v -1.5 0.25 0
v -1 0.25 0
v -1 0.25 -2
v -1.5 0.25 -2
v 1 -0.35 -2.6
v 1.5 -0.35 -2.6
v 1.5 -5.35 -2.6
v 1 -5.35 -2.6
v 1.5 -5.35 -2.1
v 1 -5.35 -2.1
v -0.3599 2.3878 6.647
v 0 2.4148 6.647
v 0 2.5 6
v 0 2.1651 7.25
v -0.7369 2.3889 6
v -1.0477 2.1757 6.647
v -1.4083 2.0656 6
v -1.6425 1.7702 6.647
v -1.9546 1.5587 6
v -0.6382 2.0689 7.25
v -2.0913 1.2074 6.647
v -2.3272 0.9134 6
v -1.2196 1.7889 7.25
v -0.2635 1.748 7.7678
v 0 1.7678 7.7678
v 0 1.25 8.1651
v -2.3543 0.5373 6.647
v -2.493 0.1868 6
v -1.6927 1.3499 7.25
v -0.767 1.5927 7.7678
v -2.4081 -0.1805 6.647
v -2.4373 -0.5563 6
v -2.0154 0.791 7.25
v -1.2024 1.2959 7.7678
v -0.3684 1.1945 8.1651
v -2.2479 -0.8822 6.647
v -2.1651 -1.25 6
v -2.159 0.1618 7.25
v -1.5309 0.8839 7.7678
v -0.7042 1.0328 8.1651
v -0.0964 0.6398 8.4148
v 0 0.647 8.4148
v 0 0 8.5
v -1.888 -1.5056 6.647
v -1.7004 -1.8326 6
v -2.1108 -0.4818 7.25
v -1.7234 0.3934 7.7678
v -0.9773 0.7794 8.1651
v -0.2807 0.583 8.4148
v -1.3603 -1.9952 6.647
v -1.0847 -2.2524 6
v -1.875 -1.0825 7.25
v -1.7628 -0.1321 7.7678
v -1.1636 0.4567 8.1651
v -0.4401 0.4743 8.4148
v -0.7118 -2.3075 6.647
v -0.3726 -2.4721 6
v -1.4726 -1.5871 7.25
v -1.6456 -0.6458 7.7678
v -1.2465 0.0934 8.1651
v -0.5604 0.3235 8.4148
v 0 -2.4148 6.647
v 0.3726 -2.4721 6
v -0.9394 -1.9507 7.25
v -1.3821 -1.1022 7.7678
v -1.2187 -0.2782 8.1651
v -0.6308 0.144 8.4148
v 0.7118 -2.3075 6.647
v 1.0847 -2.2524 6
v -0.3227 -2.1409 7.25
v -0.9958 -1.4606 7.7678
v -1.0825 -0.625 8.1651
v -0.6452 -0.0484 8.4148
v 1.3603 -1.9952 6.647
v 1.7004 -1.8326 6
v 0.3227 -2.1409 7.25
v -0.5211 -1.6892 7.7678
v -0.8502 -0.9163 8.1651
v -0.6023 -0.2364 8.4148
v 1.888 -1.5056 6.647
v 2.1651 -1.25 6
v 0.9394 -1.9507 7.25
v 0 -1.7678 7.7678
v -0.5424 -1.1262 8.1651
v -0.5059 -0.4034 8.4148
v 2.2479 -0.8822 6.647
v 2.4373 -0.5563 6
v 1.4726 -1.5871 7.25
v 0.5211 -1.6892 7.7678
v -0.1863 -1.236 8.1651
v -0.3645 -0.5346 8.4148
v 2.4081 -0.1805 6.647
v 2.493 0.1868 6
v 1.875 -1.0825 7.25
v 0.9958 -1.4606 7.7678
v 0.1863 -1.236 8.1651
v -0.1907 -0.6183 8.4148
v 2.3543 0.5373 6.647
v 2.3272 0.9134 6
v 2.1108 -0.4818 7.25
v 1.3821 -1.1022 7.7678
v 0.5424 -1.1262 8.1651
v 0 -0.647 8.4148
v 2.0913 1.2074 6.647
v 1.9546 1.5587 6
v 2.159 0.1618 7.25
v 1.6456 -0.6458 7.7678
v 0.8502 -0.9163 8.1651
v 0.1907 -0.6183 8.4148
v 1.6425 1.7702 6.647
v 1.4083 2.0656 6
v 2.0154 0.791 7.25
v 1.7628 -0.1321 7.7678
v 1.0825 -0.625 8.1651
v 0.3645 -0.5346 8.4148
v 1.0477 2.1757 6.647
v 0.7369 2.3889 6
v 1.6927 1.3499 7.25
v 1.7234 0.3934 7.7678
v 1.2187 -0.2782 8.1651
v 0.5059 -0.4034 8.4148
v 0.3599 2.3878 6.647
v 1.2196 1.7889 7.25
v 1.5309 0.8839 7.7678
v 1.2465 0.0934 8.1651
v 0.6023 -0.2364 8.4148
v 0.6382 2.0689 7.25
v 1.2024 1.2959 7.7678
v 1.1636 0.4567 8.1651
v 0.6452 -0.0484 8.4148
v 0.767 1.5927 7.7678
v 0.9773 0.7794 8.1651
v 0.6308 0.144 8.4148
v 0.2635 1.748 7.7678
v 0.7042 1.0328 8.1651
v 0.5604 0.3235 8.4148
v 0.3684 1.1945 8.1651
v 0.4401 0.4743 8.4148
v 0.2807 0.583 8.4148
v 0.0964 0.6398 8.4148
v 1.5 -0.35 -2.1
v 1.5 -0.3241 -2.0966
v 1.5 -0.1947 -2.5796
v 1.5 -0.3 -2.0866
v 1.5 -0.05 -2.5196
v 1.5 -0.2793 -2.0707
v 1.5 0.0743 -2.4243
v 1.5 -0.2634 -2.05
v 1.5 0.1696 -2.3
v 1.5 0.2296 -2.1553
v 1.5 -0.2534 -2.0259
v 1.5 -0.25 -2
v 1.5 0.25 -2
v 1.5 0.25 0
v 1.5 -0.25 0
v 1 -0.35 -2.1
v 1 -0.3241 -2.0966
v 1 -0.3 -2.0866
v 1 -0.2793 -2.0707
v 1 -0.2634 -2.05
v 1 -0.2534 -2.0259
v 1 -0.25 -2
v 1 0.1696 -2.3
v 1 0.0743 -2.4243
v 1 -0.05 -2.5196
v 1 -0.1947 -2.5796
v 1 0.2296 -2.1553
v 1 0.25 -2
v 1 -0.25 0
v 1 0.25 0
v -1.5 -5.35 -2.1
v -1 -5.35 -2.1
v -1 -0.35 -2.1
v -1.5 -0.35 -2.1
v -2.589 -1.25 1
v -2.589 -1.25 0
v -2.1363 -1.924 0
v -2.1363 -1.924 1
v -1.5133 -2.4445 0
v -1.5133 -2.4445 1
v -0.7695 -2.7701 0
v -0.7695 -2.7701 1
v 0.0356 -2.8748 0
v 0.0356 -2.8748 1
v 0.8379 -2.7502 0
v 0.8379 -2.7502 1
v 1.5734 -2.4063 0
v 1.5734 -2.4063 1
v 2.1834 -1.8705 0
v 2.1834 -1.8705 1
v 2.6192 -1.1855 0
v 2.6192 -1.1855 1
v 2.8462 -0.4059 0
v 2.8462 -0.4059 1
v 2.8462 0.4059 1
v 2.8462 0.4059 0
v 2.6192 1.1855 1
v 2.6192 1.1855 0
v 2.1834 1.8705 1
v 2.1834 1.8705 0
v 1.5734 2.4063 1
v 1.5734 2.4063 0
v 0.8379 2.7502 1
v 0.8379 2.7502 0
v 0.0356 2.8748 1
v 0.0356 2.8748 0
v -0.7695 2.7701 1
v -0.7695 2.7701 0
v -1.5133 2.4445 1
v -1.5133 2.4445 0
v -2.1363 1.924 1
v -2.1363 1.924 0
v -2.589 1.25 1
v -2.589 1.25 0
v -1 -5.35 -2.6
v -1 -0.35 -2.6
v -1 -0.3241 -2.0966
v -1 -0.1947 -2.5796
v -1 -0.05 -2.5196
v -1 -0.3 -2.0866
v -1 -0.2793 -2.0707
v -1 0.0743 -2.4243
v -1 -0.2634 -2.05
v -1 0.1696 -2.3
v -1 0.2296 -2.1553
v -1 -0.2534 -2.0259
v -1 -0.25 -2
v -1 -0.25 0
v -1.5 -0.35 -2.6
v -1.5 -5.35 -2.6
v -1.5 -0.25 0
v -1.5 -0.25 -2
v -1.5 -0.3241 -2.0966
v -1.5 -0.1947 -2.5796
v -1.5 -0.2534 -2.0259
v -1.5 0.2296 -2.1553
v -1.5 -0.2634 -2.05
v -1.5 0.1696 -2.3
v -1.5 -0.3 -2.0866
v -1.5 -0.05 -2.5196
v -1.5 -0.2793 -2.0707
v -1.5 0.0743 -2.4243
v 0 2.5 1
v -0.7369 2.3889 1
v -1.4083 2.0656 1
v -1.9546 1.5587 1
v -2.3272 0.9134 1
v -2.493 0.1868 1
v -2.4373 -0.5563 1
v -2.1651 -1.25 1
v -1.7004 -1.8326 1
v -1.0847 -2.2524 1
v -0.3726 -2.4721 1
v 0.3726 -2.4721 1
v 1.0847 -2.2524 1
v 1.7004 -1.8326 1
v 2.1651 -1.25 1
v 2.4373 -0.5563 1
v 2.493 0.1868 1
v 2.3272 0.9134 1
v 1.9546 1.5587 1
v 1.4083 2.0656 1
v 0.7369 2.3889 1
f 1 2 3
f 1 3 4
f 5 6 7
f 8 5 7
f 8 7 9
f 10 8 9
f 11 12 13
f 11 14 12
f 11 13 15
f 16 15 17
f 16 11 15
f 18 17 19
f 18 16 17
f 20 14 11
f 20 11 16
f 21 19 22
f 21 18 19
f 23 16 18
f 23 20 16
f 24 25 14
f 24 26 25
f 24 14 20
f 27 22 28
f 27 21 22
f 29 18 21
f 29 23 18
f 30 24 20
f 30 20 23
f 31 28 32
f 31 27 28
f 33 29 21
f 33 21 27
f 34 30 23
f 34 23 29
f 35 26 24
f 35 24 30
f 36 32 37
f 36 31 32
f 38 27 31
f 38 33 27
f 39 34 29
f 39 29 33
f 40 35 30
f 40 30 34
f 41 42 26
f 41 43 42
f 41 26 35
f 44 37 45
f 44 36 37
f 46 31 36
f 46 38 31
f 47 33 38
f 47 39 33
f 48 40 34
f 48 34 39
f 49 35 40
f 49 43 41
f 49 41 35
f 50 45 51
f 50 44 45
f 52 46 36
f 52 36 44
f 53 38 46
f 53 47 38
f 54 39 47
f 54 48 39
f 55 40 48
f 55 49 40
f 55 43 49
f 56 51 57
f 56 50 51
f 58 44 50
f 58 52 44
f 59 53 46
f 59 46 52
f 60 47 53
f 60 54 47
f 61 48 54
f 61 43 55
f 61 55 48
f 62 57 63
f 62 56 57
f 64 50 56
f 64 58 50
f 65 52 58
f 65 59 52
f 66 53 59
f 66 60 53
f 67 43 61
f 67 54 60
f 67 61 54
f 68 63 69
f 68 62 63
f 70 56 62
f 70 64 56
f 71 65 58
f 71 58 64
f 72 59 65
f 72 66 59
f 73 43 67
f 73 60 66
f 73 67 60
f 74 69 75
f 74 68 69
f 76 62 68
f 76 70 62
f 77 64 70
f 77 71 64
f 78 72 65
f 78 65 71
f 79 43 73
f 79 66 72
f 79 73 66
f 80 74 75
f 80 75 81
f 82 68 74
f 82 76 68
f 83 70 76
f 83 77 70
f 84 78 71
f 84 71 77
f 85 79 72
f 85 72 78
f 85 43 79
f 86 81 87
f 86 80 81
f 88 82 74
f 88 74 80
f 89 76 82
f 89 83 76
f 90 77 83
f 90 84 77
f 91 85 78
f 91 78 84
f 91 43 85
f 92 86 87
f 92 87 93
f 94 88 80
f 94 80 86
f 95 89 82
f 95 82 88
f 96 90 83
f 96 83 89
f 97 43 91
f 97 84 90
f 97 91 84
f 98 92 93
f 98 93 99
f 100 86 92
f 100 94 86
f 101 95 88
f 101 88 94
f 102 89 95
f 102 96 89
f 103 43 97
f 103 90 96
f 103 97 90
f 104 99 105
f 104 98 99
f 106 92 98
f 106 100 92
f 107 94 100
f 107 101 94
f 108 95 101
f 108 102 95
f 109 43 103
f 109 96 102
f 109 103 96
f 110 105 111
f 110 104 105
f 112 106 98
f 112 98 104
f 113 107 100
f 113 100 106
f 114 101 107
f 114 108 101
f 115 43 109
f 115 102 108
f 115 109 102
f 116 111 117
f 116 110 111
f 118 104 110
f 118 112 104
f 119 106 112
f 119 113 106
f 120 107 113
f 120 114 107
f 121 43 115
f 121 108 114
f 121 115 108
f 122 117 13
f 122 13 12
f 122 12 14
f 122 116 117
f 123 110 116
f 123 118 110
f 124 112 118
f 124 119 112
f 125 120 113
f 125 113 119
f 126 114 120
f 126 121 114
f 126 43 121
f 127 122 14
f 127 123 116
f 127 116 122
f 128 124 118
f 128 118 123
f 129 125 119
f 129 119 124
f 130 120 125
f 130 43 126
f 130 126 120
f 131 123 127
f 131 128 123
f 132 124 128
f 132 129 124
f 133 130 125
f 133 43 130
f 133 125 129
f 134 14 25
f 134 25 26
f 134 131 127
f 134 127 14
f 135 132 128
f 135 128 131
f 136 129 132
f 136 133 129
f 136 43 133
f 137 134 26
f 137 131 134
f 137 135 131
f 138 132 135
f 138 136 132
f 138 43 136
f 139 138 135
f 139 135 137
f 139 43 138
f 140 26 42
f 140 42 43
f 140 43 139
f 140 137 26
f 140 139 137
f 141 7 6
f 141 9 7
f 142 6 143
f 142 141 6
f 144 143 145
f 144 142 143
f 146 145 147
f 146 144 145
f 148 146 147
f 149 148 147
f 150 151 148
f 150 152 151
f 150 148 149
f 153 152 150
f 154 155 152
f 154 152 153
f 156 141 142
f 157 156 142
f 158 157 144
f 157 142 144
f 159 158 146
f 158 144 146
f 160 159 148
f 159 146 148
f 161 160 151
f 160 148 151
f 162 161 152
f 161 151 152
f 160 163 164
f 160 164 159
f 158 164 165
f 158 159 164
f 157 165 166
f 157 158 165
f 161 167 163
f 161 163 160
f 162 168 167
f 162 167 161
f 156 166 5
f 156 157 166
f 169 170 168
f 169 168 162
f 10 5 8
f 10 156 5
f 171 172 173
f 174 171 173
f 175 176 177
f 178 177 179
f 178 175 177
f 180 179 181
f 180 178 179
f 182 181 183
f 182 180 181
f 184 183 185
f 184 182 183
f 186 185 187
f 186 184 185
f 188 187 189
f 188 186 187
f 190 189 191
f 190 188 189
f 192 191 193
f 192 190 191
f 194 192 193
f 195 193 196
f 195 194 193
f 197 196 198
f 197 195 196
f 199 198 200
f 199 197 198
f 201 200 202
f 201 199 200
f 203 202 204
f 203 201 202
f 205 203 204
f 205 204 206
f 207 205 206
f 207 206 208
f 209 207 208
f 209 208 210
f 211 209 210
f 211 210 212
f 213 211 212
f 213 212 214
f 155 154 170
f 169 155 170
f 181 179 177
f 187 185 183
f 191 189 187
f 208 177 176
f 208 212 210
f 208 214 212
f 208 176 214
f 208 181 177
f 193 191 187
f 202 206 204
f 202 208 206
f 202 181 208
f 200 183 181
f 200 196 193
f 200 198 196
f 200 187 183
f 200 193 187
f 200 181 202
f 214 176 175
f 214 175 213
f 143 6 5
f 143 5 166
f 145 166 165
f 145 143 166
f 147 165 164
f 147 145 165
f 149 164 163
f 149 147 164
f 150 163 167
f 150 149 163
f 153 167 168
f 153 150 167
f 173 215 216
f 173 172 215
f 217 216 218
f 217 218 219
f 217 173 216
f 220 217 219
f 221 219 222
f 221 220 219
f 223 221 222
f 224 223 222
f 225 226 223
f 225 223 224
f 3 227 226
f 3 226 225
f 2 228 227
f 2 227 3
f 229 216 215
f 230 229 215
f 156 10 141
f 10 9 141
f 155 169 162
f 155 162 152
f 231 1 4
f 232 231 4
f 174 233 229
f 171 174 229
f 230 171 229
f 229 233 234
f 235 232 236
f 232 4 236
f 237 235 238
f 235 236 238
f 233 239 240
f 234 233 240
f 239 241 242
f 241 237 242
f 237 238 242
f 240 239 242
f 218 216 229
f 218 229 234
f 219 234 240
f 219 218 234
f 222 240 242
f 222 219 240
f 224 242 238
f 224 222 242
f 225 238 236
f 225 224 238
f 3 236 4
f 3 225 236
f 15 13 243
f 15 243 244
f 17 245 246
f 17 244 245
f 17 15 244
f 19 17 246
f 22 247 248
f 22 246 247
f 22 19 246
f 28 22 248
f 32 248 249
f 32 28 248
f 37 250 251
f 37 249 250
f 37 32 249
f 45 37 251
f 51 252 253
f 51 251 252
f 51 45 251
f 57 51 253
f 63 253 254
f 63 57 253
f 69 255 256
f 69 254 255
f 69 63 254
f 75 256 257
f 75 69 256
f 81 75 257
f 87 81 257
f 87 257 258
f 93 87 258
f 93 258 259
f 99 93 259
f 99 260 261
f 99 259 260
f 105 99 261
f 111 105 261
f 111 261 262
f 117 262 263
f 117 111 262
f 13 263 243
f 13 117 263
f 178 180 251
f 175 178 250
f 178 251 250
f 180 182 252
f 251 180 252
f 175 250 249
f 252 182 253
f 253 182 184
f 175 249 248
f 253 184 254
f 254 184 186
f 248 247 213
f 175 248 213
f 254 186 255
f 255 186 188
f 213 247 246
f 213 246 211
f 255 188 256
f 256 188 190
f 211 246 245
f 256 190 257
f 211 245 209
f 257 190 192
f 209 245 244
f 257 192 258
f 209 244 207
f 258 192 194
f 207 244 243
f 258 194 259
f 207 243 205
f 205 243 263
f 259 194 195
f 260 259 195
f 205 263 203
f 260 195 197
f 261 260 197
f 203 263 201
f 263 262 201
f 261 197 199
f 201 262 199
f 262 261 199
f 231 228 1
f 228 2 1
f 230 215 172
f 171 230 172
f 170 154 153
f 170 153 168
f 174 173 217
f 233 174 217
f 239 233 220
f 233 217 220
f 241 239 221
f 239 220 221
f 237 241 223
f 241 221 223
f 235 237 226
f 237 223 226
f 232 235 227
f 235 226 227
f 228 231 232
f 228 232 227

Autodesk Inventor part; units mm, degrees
ref_plane "YZ Plane" through (0, 0, 0) normal (1, 0, 0) x (0, 1, 0)
ref_plane "XZ Plane" through (0, 0, 0) normal (0, 1, 0) x (-1, 0, 0)
ref_plane "XY Plane" through (0, 0, 0) normal (0, 0, 1) x (1, 0, 0)
sketch "Sketch1" plane through (0, 0, 0) normal (1, 0, 0) x (0, 1, 0)
  line L0 (0, 0) -> (2.5, 0)
  line L1 (2.5, 0) -> (2.5, 8.5)
  line L2 (2.5, 8.5) -> (0, 8.5)
  line L3 (0, 8.5) -> (0, 0)
  line L4 (2.5, 0) -> (2.875, 0)
  line L5 (2.875, 0) -> (2.875, 1)
  line L6 (2.875, 1) -> (2.5, 1)
  line L7 (2.5, 1) -> (2.5, 0)
  arc A0 (0, 3.5) -> (0, 8.5) centre (0, 6) ccw
  point P0 (2.5, 6)
  dimension "d0" = 2.5
  dimension "d1" = 8.5
  dimension "d2" = 0.375
  dimension "d3" = 1
revolve "Revolution1" add sketch "Sketch1" angle 360 about axis through (0, 0, 8.5) along (0, 0, -1) contours L3 A0 L1 L0 | L1 L6 L5 L4 | L3 A0
sketch "Sketch2" plane through (0, 0, 0) normal (0, 0, -1) x (-1, 0, 0)
  circle A0 centre (0, 0) radius 2.875 projected
  line L0 (0, 0) -> (2.589, 0)
  line L1 (2.589, 0) -> (2.589, 1.25)
  line L2 (2.589, 1.25) -> (0, 1.25)
  line L3 (0, 1.25) -> (0, 0)
  line L4 (0, 0) -> (2.589, 0)
  line L5 (2.589, 0) -> (2.589, -1.25)
  line L6 (2.589, -1.25) -> (0, -1.25)
  line L7 (0, -1.25) -> (0, 0)
  arc A1 (2.589, -1.25) -> (2.589, 1.25) centre (0, 0) ccw
  dimension "d5" = 1.25
  dimension "d6" = 1.25
extrude "Extrusion1" cut sketch "Sketch2" against normal blind 10 contours A0 L5 L1
sketch "Sketch3" plane through (0, 0, 0) normal (0, 0, -1) x (-1, 0, 0)
  line L0 (0, 0) -> (-1.5, 0)
  line L1 (-1.5, 0) -> (-1.25, 0)
  line L2 (-1, -0.25) -> (-1.5, -0.25)
  line L3 (-1.5, -0.25) -> (-1.5, 0.25)
  line L4 (-1.5, 0.25) -> (-1, 0.25)
  line L5 (-1, 0.25) -> (-1, -0.25)
  line L6 (-1, -0.25) -> (-1.5, 0.25) construction
  line L7 (-1.5, -0.25) -> (-1, 0.25) construction
  line L8 (0, 0) -> (1.25, 0)
  line L9 (1.5, -0.25) -> (1, -0.25)
  line L10 (1, -0.25) -> (1, 0.25)
  line L11 (1, 0.25) -> (1.5, 0.25)
  line L12 (1.5, 0.25) -> (1.5, -0.25)
  line L13 (1.5, -0.25) -> (1, 0.25) construction
  line L14 (1, -0.25) -> (1.5, 0.25) construction
  dimension "d9" = 1.5
  dimension "d10" = 0.25
  dimension "d11" = 0.5
  dimension "d12" = 1.25
  dimension "d13" = 0.5
  dimension "d14" = 0.5
extrude "Extrusion2" add sketch "Sketch3" along normal blind 2 separate body
sketch "Sketch5" plane through (1.5, -0.25, 0) normal (1, 0, 0) x (0, 0, -1)
  line L0 (0, 0) -> (2, 0) projected
  line L1 (2, 0) -> (2, -0.1)
  line L2 (2, -0.1) -> (2.1, -0.1)
  arc A0 (2.1, -0.1) -> (2, 0) centre (2, -0.1) ccw
  line L3 (2.1, -0.1) -> (2.6, -0.1)
  line L4 (0, 0.5) -> (2, 0.5) projected
  arc A1 (2.6, -0.1) -> (2, 0.5) centre (2, -0.1) ccw
  line L5 (2.1, -0.1) -> (2.6, -0.1)
  line L6 (2.6, -0.1) -> (2.6, -5.1)
  line L7 (2.6, -5.1) -> (2.1, -5.1)
  line L8 (2.1, -5.1) -> (2.1, -0.1)
  line L9 (0, 0.5) -> (2, 0.5) projected
  line L10 (2, 0.5) -> (2, 0)
  point P0 (0, 0.25)
  dimension "d20" = 0.1
  dimension "d21" = 0.1
  dimension "d22" = 0.1
  dimension "d23" = 0.5
  dimension "d24" = 0.6
  dimension "d25" = 5
extrude "Extrusion4" add sketch "Sketch5" against normal blind 3 contours L10 A1 L3 A0 | L3 L6 L7 L8 bodies 2
extrude "Extrusion5" cut sketch "Sketch5" against normal blind 2.5 contours L10 A1 L3 A0 | L3 L6 L7 L8 bodies 2
extrude "Extrusion6" add sketch "Sketch5" against normal blind 0.5 contours L10 A1 L3 A0 | L3 L6 L7 L8 bodies 2
properties part number "IR_TSAL6400"
